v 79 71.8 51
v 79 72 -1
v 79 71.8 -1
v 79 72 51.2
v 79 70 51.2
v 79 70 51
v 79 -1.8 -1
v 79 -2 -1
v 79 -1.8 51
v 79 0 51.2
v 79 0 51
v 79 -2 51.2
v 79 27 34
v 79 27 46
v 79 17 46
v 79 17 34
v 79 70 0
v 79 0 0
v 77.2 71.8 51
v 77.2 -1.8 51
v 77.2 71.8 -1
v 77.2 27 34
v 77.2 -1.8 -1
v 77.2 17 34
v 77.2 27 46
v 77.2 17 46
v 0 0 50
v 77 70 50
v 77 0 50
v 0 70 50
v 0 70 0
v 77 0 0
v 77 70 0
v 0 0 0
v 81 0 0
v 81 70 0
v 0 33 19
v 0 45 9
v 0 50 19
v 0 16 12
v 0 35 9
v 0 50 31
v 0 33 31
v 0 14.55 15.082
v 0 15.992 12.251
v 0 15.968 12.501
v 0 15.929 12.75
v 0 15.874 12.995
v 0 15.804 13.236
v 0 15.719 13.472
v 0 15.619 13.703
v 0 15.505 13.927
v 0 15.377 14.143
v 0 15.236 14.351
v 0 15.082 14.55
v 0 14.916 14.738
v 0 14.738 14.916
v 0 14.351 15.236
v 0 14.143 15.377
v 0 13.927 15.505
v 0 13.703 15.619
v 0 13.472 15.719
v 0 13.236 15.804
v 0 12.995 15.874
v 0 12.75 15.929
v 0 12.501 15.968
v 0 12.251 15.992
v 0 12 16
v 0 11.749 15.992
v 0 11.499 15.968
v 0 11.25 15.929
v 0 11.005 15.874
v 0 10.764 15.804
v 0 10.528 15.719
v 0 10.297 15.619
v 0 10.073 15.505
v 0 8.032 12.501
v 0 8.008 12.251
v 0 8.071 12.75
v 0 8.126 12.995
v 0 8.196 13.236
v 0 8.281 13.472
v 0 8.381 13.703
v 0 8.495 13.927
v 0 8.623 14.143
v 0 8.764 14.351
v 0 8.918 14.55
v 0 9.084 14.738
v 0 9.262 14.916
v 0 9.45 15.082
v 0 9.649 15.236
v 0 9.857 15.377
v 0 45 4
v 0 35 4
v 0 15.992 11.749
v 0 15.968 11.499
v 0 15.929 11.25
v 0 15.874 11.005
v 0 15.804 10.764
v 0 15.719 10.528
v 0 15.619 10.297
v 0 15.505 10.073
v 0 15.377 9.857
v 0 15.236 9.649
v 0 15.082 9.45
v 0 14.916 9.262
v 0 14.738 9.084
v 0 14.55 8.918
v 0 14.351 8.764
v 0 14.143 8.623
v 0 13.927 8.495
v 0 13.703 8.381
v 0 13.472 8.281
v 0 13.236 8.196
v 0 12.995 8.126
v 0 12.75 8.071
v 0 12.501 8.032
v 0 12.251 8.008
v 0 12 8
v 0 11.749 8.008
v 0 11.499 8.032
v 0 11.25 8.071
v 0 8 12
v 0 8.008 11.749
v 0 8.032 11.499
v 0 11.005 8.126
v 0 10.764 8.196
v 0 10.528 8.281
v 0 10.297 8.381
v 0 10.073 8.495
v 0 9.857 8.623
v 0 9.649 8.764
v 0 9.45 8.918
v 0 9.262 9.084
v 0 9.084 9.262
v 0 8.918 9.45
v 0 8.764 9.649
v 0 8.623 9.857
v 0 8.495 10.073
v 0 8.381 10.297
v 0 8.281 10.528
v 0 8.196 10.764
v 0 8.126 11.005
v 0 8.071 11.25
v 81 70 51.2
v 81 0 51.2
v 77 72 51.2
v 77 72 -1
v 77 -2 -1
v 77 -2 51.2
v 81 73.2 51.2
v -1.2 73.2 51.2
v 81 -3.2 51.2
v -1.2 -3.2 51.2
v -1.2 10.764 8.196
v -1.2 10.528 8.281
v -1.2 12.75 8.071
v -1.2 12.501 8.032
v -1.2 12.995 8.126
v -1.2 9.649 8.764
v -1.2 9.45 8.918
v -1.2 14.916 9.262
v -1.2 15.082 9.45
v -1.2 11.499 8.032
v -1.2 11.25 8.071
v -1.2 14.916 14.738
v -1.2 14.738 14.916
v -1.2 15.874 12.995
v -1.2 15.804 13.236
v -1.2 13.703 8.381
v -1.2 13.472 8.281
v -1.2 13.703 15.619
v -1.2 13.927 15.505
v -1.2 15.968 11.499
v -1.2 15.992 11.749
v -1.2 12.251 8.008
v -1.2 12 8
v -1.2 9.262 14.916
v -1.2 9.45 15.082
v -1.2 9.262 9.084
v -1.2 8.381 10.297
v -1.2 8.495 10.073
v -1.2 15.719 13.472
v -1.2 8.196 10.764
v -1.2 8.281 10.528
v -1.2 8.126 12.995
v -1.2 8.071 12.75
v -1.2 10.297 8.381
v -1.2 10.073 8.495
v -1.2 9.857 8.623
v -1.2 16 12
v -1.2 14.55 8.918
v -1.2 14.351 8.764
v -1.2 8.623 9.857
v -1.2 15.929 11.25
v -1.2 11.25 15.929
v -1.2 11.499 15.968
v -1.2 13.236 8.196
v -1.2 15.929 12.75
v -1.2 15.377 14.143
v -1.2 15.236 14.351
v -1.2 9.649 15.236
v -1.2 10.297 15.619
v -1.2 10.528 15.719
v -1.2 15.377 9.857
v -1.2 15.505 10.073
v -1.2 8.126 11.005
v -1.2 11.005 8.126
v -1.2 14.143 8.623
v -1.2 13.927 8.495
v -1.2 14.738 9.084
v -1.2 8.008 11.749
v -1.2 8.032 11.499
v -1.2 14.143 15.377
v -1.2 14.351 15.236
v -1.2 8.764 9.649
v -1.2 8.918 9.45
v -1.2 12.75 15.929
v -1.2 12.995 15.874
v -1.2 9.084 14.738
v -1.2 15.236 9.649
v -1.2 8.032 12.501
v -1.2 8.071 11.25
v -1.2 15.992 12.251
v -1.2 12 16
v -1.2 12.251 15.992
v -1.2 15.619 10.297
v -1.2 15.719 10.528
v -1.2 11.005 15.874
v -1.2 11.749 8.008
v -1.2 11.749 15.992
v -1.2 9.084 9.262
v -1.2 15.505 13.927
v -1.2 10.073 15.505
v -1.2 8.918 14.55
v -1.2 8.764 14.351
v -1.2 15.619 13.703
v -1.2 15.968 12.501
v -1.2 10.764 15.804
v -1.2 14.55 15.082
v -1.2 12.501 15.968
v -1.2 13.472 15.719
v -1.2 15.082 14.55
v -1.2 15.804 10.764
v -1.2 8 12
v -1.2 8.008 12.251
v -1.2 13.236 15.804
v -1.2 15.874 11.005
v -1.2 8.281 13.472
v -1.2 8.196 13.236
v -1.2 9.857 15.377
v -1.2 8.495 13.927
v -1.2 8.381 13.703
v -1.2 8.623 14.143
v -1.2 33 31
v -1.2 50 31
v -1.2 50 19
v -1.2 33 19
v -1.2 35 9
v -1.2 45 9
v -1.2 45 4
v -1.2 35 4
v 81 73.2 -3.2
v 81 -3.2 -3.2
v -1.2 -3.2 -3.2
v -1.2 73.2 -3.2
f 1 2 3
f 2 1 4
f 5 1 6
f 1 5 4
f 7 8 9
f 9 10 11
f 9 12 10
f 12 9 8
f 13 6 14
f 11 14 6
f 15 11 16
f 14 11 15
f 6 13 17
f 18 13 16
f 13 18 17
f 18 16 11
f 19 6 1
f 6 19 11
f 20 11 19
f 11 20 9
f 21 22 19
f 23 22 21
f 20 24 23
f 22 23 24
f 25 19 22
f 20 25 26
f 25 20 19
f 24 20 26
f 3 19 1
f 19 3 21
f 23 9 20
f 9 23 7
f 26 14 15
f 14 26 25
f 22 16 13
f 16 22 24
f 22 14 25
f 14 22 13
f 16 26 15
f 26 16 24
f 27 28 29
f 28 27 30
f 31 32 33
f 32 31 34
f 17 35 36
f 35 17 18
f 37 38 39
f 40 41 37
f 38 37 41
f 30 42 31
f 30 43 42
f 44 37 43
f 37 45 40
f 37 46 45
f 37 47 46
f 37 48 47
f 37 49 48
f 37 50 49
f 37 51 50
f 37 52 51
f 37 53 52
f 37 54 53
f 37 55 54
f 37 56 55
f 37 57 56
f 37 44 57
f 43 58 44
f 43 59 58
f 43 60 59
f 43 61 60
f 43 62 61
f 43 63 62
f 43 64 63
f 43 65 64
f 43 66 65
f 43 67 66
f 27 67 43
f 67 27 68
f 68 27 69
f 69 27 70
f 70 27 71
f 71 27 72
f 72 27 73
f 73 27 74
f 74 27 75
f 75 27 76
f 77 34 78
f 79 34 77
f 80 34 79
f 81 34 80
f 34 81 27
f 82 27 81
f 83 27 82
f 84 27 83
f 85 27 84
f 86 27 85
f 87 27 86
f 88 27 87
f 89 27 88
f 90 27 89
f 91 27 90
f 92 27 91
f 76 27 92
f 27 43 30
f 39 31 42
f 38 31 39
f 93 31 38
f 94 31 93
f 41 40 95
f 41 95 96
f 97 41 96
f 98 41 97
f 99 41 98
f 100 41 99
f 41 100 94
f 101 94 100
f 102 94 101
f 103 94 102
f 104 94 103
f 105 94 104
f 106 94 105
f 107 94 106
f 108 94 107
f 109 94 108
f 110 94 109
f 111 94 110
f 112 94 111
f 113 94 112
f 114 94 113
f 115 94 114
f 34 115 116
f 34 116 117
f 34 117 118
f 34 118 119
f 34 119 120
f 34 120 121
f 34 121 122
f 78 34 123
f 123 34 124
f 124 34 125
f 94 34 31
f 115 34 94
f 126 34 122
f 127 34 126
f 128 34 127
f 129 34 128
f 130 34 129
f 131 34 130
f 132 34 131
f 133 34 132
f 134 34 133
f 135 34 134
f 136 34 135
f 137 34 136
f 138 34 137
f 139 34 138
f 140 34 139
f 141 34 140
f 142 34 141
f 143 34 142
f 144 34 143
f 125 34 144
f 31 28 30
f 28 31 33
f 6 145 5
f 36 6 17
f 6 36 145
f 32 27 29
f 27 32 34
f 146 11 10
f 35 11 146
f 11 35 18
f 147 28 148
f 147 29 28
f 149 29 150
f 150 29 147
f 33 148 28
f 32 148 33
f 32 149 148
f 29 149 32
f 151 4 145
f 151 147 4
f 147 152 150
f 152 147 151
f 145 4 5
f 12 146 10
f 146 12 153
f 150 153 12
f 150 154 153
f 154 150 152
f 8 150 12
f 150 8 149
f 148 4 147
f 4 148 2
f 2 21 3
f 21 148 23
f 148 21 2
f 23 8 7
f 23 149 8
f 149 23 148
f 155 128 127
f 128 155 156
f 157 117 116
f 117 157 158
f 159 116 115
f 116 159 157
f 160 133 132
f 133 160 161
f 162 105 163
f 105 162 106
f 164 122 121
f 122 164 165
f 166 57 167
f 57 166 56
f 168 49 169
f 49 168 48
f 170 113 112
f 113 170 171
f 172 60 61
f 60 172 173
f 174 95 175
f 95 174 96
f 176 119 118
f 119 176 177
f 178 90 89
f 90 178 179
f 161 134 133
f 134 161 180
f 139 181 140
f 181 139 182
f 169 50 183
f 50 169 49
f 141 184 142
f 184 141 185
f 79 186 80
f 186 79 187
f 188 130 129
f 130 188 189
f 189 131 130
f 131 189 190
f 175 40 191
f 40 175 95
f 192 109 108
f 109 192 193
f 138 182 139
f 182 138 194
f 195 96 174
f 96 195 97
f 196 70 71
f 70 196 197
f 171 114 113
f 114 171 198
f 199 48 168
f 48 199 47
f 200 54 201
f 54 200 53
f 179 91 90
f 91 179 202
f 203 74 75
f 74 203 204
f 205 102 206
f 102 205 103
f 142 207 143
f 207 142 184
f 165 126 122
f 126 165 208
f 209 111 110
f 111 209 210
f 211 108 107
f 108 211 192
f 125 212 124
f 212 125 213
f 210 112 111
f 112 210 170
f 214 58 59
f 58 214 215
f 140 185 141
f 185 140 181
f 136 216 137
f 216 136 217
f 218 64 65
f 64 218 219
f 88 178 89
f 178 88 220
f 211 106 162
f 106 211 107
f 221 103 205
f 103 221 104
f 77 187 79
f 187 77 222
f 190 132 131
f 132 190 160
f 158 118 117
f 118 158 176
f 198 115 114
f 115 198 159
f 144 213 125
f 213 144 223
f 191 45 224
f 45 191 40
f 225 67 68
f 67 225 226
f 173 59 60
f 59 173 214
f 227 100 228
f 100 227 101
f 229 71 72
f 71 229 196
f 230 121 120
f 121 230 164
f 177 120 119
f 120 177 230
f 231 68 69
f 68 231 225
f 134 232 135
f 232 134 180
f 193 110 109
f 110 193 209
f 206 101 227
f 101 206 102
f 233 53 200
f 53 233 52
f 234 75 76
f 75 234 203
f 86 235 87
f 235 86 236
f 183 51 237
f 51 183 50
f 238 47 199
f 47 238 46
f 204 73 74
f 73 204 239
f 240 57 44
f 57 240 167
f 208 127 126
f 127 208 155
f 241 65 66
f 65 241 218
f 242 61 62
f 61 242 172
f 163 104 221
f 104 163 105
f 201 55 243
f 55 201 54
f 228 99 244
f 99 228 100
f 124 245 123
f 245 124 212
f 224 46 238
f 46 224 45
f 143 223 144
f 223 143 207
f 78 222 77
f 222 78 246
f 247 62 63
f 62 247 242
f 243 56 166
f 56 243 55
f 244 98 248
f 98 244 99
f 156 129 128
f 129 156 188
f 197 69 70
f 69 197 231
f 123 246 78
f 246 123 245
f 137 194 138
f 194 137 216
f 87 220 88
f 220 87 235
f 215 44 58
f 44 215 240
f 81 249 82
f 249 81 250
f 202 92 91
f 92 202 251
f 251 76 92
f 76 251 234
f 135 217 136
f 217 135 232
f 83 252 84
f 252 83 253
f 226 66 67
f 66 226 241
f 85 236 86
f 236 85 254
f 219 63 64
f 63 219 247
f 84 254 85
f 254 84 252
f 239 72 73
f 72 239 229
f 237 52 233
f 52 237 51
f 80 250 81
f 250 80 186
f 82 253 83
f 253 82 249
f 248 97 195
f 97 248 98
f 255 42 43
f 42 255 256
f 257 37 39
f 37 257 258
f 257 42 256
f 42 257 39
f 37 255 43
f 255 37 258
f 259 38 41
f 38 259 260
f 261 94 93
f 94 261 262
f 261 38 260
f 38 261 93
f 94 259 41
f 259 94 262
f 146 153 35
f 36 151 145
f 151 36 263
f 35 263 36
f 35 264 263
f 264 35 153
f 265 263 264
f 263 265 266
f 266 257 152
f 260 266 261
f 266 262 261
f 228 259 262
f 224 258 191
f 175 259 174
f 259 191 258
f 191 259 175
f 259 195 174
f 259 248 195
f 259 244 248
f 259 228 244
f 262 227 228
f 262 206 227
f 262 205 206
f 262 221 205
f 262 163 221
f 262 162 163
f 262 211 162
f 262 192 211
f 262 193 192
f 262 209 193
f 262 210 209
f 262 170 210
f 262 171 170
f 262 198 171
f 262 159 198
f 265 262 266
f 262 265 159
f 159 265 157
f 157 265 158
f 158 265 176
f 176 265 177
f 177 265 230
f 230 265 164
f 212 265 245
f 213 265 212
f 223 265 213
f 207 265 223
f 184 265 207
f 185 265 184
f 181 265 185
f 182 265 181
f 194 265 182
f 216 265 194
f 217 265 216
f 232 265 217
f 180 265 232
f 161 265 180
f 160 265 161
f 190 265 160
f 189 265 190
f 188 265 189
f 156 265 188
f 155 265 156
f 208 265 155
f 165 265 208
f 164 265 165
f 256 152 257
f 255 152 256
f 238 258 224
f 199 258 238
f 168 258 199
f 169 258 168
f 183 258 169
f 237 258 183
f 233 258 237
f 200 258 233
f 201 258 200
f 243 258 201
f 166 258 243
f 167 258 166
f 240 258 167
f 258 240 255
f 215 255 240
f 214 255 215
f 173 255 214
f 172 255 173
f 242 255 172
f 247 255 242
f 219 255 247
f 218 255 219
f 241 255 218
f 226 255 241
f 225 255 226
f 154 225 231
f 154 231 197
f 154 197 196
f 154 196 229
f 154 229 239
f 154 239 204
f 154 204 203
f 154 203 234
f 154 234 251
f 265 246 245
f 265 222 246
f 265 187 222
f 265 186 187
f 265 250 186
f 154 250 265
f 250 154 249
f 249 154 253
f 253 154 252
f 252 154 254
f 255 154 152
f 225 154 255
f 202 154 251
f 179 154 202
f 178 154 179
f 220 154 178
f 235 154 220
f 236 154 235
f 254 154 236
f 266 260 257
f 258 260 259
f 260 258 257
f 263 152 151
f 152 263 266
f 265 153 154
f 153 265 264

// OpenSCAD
MARGIN = 1; // marge de sécurité sur les mesures pour les trous
HAUTEUR = 50; // hauteur du boîtier (intérieur): z
HAUTEUR_BAS = 3; // compenser en bas (z) (soudures en dessous de l'Arduino)
LARGEUR = 70; // largeur du boîtier (intérieur): y
LARGEUR_D = 4; // de combien la plaque dépasse à droite: y
LARGEUR_G = 14; // de combien la plaque dépasse à gauche: y
LONGUEUR = 82-5; // Longueur du boîtier (intérieur): x - 5mm pour la prise USB qui dépasse
EPAISSEUR = 1.2; // épaisseur des parois
EPA_COUVERCLE = 4; // epaisseur du couvercle

PROF_RAIL = 2; // profondeur du rail
LARG_RAIL = EPA_COUVERCLE/2; // largeur du rail

module boitier() {
difference(){
    translate([-EPAISSEUR,-EPAISSEUR-PROF_RAIL,-EPAISSEUR-PROF_RAIL])
        cube([LONGUEUR+EPAISSEUR+EPA_COUVERCLE,LARGEUR+2*EPAISSEUR+2*PROF_RAIL,HAUTEUR+2*EPAISSEUR+PROF_RAIL]);
    
    union(){
        // intérieur de la boîte
        translate([0, 0, 0])
		    cube([LONGUEUR+EPA_COUVERCLE+2, LARGEUR, HAUTEUR]);
        
        // couvercle
        translate([LONGUEUR, 0, 2])
		    cube([EPA_COUVERCLE+2, LARGEUR, HAUTEUR]);
        
        // rail gauche
        translate([LONGUEUR,-PROF_RAIL,0]){
            cube([LARG_RAIL,PROF_RAIL+1,HAUTEUR+EPAISSEUR]);  
            }
       // rail droit
       translate([LONGUEUR,LARGEUR-1,0]){
            cube([LARG_RAIL,PROF_RAIL+1,HAUTEUR+EPAISSEUR]);  
            }
            
       // rail bas
       translate([LONGUEUR,-PROF_RAIL,-PROF_RAIL+1]){
            cube([LARG_RAIL,LARGEUR+2*LARG_RAIL,PROF_RAIL+1]);  
            }
        
//        // Trous de 3mm au fond du boîtier
//        translate([25, 55, -EPAISSEUR-1])
//            cylinder(d=3, h=10, $fn=100);
//        translate([24, 7, -EPAISSEUR-1])
//            cylinder(d=3, h=10, $fn=100);
//
//        translate([76, 38, -EPAISSEUR-1])
//            cylinder(d=3, h=10, $fn=100);
//        translate([76, 10, -EPAISSEUR-1])
//            cylinder(d=3, h=10, $fn=100);
        
        // trou pour l'alimentation
        translate([-15, 8+LARGEUR_D, 9+HAUTEUR_BAS])
            rotate([0,90,0])
                cylinder(d=6+2*MARGIN, h=20, $fn=100);
        
        // trou pour USB
        translate([-10, 30+LARGEUR_D-MARGIN, 17-MARGIN+HAUTEUR_BAS])
			cube([20, 15+2*MARGIN, 10+2*MARGIN]);
            
        // trou pour mini-USB
        translate([-10, 32+LARGEUR_D-MARGIN, MARGIN+HAUTEUR_BAS])
			cube([20, 8+2*MARGIN, 5]);
            
        // trou pour la diode (IR receiver)
//        translate([LONGUEUR-10, 18-MARGIN, 32-MARGIN+HAUTEUR_BAS])
//			cube([20, 8+2*MARGIN, 10+2*MARGIN]);
	}
    }
}

// Module de création du couvercle
module couvercle(){
    margin = 0.2;
    difference(){
        // couvercle
        translate([margin, -PROF_RAIL+margin, -PROF_RAIL+margin]){
        cube([LARG_RAIL-margin, LARGEUR+2*PROF_RAIL-2*margin, HAUTEUR+EPAISSEUR+PROF_RAIL-2*margin]);
        }
        
        // trou pour la diode (IR receiver)
        translate([-2, 18-MARGIN, 32-MARGIN+HAUTEUR_BAS])
            cube([20, 8+2*MARGIN, 10+2*MARGIN]);
    }
}


// Créer le modèle 3D du boîtier
translate([LONGUEUR, 0, 0]){
        couvercle();
    }
boitier();


// VUES: pour mesure sur QCAD - boîtier

// vue de devant (USB, alim, mini-USB)
//projection(cut = true){
//    translate([0,0,-EPAISSEUR/2]) {
//        rotate([0,90,0]) {
//            create_boitier();
//        }
//    }
//}

// vue de derrière (diode)
//projection(cut = true){
//    translate([0,0,-LONGUEUR-EPAISSEUR/2]) {
//        rotate([0,270,0]) {
//            create_boitier();
//        }
//    }
//}

//vue de dessous (vis)
//projection(cut = true){
//    translate([0,0,EPAISSEUR/2]) {
//        rotate([0,0,0]) {
//            create_boitier();
//        }
//    }
//}
